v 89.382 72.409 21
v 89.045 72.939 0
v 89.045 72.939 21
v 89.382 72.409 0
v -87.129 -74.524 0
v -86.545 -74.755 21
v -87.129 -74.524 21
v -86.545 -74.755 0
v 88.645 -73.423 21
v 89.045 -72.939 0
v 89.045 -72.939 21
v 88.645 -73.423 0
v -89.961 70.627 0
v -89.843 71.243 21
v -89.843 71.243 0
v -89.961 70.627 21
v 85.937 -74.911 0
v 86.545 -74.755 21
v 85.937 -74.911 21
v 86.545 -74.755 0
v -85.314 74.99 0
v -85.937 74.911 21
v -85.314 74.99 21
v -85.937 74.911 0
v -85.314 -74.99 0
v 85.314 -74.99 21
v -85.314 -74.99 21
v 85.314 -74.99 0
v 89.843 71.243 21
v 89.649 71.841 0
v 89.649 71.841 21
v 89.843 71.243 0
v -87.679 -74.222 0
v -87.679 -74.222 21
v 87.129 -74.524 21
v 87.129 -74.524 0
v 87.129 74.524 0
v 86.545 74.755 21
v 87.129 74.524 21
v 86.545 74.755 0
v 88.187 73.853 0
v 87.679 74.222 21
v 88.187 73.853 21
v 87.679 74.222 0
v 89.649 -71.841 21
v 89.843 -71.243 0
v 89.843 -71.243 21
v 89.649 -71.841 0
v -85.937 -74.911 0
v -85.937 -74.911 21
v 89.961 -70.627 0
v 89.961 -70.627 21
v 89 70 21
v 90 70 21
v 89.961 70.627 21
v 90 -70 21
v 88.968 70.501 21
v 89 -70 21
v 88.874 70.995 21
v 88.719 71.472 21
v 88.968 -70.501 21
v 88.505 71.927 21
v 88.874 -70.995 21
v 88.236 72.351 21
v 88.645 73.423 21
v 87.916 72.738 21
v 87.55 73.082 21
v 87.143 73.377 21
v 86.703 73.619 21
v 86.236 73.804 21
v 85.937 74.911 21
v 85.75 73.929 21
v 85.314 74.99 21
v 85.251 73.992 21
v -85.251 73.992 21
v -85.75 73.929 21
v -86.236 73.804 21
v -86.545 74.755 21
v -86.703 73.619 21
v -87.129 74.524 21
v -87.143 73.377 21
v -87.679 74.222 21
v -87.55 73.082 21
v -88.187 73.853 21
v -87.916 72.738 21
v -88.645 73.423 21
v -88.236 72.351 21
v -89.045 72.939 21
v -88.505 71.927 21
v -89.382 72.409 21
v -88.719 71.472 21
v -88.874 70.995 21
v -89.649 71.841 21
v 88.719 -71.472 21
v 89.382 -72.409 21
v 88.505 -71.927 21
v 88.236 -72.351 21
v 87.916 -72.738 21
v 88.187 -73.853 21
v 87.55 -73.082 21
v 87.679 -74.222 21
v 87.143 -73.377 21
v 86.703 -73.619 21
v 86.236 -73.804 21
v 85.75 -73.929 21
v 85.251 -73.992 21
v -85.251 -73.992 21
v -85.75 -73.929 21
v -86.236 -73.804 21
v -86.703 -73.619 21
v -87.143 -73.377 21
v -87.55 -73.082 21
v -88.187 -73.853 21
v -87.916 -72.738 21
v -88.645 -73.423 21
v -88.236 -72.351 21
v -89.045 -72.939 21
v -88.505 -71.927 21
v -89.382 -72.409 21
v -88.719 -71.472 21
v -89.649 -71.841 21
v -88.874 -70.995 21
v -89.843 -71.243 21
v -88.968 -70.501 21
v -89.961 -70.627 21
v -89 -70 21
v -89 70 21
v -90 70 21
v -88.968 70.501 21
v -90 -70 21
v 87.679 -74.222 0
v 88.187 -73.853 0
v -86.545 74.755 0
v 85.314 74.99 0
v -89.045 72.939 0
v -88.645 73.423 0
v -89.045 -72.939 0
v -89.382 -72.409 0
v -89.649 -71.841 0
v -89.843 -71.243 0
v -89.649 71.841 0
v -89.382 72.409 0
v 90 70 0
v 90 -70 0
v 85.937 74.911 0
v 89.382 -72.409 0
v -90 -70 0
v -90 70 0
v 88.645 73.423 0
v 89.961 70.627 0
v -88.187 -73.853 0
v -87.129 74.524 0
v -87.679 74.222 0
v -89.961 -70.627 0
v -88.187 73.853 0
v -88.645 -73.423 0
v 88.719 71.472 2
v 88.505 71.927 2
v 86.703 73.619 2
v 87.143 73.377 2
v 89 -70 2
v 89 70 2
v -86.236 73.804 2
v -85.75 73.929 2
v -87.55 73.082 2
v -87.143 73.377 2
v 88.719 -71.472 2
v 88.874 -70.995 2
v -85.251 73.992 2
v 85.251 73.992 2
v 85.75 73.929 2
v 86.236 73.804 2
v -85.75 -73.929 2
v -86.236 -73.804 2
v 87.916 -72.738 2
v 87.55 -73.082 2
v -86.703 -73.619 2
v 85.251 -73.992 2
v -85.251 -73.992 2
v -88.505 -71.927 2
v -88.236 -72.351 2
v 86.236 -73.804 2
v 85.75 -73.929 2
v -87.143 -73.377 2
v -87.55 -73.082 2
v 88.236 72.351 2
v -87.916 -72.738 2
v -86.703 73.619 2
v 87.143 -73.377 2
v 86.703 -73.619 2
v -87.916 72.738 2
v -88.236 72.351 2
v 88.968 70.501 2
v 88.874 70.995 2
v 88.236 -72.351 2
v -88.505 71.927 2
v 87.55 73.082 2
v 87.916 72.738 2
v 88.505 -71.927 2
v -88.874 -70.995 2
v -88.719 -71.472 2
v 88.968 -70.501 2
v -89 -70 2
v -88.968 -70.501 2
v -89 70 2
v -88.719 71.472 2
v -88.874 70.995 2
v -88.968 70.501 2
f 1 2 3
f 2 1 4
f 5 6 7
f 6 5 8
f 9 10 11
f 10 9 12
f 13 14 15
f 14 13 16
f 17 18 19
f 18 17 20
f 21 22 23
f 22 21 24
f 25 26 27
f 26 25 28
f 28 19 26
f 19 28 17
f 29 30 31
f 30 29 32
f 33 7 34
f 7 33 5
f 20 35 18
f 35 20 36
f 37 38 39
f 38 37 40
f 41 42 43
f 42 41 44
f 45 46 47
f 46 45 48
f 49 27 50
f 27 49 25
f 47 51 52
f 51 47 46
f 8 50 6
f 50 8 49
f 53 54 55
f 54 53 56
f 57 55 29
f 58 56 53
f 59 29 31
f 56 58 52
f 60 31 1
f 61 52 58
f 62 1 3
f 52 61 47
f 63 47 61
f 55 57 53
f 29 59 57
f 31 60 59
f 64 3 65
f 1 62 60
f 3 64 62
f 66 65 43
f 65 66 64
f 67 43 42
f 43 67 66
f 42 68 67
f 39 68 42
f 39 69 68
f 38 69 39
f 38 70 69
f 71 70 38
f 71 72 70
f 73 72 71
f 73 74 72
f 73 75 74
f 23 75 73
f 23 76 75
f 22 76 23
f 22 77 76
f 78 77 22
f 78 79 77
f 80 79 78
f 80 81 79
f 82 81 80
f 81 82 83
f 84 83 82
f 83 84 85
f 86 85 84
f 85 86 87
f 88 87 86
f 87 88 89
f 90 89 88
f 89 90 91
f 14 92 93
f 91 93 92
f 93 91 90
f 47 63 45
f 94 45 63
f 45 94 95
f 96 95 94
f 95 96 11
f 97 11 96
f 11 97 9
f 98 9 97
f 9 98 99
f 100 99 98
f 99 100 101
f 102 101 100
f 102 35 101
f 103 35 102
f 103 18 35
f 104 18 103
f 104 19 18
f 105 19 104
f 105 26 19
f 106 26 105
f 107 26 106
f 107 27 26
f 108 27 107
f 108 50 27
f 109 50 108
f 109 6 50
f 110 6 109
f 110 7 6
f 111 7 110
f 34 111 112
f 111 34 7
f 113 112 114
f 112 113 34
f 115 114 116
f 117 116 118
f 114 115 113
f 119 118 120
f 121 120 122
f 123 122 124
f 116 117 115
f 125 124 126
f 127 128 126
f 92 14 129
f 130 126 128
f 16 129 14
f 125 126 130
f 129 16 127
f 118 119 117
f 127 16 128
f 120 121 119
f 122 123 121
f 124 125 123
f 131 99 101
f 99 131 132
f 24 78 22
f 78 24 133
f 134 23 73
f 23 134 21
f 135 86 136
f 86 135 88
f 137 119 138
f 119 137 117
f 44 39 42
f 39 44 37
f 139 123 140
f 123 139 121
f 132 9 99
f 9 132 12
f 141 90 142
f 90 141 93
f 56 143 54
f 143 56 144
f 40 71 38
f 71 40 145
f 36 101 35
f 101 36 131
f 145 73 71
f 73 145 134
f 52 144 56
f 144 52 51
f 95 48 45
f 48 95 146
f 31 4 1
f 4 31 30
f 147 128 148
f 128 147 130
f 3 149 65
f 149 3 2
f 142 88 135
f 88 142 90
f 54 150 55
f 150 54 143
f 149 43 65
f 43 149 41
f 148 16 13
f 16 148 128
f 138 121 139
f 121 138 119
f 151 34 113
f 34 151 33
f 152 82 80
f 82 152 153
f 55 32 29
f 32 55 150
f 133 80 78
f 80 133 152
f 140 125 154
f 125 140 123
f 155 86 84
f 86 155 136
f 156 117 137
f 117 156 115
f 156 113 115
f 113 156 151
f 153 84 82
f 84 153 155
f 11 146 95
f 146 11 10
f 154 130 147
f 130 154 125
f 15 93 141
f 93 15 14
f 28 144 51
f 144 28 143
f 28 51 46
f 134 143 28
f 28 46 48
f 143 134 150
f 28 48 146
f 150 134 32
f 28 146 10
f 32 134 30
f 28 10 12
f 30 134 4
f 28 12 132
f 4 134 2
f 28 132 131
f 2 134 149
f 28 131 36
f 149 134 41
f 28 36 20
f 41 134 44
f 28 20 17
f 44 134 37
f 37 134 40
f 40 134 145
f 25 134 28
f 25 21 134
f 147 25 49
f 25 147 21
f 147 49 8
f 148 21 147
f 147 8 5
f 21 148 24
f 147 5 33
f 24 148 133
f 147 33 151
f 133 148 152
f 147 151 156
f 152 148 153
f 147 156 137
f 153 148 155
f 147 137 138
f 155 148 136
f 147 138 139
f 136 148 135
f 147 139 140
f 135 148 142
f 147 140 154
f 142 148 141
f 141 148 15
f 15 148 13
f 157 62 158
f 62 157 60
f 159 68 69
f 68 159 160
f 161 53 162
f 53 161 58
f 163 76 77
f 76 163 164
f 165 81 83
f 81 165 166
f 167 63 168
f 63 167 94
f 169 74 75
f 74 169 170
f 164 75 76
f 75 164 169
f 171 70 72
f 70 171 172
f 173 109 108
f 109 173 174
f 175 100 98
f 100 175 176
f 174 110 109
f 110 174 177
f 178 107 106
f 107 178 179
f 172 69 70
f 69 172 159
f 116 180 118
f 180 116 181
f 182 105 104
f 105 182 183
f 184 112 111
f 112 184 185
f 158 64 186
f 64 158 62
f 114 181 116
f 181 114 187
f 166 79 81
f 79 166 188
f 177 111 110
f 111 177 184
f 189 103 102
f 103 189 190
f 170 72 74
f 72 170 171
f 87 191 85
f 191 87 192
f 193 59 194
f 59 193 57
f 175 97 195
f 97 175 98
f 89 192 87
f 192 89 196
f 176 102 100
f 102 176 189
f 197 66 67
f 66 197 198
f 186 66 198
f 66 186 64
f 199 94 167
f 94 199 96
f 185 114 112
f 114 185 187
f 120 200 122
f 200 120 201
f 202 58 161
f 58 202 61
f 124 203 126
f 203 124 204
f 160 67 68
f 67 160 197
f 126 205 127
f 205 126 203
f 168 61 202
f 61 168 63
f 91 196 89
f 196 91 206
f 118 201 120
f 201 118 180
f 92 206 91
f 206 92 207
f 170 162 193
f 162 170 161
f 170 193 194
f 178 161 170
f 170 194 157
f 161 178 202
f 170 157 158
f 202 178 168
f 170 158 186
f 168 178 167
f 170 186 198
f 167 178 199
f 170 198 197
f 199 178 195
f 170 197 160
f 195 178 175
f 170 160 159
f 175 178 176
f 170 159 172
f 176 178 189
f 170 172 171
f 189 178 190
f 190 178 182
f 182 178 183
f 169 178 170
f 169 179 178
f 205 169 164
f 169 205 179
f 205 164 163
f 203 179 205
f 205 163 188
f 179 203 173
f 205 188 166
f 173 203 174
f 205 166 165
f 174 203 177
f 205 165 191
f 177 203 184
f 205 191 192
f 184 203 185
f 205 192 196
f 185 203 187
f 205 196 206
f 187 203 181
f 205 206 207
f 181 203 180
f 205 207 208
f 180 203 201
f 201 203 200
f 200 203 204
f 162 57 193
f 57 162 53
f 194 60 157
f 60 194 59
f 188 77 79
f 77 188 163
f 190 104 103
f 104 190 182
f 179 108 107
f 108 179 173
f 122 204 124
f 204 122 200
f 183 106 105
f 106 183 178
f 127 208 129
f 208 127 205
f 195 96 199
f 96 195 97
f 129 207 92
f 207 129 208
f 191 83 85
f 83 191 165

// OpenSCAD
$fn = 50;


difference() {
	union() {
		hull() {
			translate(v = [-85.0000000000, 70.0000000000, 0]) {
				cylinder(h = 21, r = 5);
			}
			translate(v = [85.0000000000, 70.0000000000, 0]) {
				cylinder(h = 21, r = 5);
			}
			translate(v = [-85.0000000000, -70.0000000000, 0]) {
				cylinder(h = 21, r = 5);
			}
			translate(v = [85.0000000000, -70.0000000000, 0]) {
				cylinder(h = 21, r = 5);
			}
		}
	}
	union() {
		translate(v = [0, 0, 2]) {
			hull() {
				translate(v = [-85.0000000000, 70.0000000000, 0]) {
					cylinder(h = 19, r = 4);
				}
				translate(v = [85.0000000000, 70.0000000000, 0]) {
					cylinder(h = 19, r = 4);
				}
				translate(v = [-85.0000000000, -70.0000000000, 0]) {
					cylinder(h = 19, r = 4);
				}
				translate(v = [85.0000000000, -70.0000000000, 0]) {
					cylinder(h = 19, r = 4);
				}
			}
		}
	}
}
